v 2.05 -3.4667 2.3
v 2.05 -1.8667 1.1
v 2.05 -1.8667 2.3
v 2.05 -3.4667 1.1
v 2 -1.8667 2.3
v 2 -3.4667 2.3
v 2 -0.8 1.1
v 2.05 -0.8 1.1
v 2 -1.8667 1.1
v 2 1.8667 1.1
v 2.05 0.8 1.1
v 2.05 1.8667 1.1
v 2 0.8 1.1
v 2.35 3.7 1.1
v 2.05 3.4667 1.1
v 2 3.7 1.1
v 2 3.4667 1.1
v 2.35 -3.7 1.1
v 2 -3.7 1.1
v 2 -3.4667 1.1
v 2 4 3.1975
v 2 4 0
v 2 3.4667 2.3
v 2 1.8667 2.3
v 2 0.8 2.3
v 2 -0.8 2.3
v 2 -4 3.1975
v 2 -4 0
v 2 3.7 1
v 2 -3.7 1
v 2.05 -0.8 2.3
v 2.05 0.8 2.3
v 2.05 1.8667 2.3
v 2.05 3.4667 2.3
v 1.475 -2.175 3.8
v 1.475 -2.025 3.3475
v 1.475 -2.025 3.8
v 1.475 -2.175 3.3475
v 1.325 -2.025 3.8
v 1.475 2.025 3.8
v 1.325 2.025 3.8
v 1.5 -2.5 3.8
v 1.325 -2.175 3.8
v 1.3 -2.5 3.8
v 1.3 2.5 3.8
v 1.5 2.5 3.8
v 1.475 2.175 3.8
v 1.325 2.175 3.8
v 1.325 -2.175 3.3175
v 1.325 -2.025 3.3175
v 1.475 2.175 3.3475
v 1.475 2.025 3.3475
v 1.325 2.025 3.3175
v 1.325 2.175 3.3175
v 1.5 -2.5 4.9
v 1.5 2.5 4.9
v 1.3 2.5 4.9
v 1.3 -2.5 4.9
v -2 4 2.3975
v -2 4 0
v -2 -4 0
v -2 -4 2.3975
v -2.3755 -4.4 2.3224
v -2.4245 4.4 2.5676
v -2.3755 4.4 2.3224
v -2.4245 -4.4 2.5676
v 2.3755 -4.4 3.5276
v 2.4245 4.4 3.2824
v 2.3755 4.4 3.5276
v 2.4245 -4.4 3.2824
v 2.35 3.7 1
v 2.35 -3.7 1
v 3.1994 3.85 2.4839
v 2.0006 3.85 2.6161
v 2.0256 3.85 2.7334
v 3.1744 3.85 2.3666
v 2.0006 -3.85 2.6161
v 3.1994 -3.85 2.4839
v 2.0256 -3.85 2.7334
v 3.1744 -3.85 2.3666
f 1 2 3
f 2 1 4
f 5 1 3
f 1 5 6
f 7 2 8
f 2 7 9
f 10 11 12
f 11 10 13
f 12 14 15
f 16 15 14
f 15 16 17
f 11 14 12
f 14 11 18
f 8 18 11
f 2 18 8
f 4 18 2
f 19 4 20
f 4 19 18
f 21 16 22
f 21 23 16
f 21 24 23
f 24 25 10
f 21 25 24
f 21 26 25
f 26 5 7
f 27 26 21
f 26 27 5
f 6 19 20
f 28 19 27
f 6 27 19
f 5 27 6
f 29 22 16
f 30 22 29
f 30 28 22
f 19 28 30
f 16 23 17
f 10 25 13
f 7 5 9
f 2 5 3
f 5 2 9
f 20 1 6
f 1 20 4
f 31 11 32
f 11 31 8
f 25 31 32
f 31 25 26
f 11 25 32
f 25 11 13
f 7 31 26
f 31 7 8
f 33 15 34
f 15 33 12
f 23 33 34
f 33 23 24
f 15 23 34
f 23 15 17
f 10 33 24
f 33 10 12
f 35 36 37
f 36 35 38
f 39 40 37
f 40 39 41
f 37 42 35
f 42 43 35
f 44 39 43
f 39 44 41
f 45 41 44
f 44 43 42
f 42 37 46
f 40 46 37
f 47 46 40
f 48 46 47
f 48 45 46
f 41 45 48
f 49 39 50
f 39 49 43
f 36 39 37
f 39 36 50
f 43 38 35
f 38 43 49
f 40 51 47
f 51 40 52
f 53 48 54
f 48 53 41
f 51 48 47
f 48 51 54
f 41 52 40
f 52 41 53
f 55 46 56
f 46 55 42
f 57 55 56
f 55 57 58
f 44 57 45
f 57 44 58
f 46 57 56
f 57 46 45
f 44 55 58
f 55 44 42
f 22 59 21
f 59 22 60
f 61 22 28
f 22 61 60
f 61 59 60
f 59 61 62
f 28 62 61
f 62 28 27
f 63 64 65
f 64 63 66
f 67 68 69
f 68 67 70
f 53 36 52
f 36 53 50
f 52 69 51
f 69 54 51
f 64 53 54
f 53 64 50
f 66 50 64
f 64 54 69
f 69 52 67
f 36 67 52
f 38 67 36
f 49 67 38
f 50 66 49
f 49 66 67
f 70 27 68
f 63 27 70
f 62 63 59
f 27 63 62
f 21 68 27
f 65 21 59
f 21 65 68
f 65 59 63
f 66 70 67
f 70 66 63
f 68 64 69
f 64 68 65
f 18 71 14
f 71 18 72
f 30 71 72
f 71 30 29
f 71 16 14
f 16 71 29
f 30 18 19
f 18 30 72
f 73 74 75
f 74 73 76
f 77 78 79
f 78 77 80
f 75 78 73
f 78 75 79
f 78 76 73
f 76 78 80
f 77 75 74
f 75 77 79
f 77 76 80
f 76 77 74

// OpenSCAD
// Ticket office — the day-ticket and season-pass window at the base area.
// A small timber booth, long across its front so several guests can be
// served side by side: three service windows on the +X façade under a
// red awning, a counter ledge beneath them, and a sign board on the roof
// so the building reads as "tickets" from the top-down camera.
//
// Conventions, units, and axis docs: see models-src/README.md.
//
//     +X = front façade (service windows face +X)
//     +Y = lateral / perpendicular horizontal
//     +Z = up in SCAD (rotates to game Y-up at export)
//   Origin sits at ground plane, centred on the footprint.

$fn = 12;

// ── Dimensions (metres) ────────────────────────────────────────────────
booth_d = 4.0; // depth, front to back along X
booth_w = 8.0; // width along Y — the service frontage
booth_h = 3.2; // wall height at the front

// Mono-pitch roof falling toward the back so snow slides off away from
// the queue.
roof_drop     = 0.8;
roof_overhang = 0.4;
roof_t        = 0.25;

// Service windows on the front face.
window_count = 3;
window_w     = 1.6;
window_h     = 1.2;
window_sill  = 1.1; // counter height
window_inset = 0.05;

// Counter ledge and awning over the windows.
ledge_depth   = 0.35;
awning_depth  = 1.2;
awning_height = 2.55;
awning_t      = 0.12;

// Roof sign.
sign_w = 5.0;
sign_h = 1.1;
sign_t = 0.2;

// ── Geometry ───────────────────────────────────────────────────────────
// Walls: side profile (front booth_h, back roof_drop lower) extruded
// across the width, so the wall tops follow the roof pitch.
module walls() {
    color("Sienna")
        rotate([90, 0, 0])
            linear_extrude(height = booth_w, center = true)
                polygon([
                    [-booth_d / 2, 0],
                    [ booth_d / 2, 0],
                    [ booth_d / 2, booth_h],
                    [-booth_d / 2, booth_h - roof_drop],
                ]);
}

// Mono-pitch slab: a thin box tilted about Y so its underside meets the
// wall tops, high at the front and falling to the back.
module roof() {
    run   = booth_d + 2 * roof_overhang;
    angle = atan(roof_drop / booth_d);
    color("DarkSlateGray")
        translate([0, 0, booth_h - roof_drop / 2 + roof_t / 2])
            rotate([0, -angle, 0])
                cube([run / cos(angle), booth_w + 2 * roof_overhang, roof_t], center = true);
}

function window_y(i) = (i - (window_count - 1) / 2) * (booth_w / window_count);

module windows() {
    for (i = [0 : window_count - 1]) {
        color("LightSkyBlue")
            translate([booth_d / 2 + window_inset / 2, window_y(i), window_sill + window_h / 2])
                cube([window_inset, window_w, window_h], center = true);
    }
}

module ledge() {
    color("Tan")
        translate([booth_d / 2 + ledge_depth / 2, 0, window_sill - 0.05])
            cube([ledge_depth, booth_w - 0.6, 0.1], center = true);
}

module awning() {
    color("FireBrick")
        translate([booth_d / 2 + awning_depth / 2, 0, awning_height])
            rotate([0, 12, 0])
                cube([awning_depth, booth_w - 0.3, awning_t], center = true);
}

// Sign board on posts along the roof's front edge, facing +X.
module sign() {
    post = 0.15;
    base = booth_h - 0.2; // posts start inside the sloped roof slab
    lift = 0.8;
    color("DimGray")
        for (y = [-sign_w / 2 + 0.4, sign_w / 2 - 0.4])
            translate([booth_d / 2 - 0.6, y, base + lift / 2])
                cube([post, post, lift], center = true);
    color("Gold")
        translate([booth_d / 2 - 0.6, 0, base + lift + sign_h / 2])
            cube([sign_t, sign_w, sign_h], center = true);
}

module ticket_office() {
    walls();
    roof();
    windows();
    ledge();
    awning();
    sign();
}

ticket_office();

// ── Footprint metadata ─────────────────────────────────────────────────
// Half-extents in SCAD coords (X, Y). The awning projects awning_depth
// past the front wall; use that side for halfX so the apron covers it.
echo("MOGUL_META", "footprint", booth_d / 2 + awning_depth, booth_w / 2 + roof_overhang);
